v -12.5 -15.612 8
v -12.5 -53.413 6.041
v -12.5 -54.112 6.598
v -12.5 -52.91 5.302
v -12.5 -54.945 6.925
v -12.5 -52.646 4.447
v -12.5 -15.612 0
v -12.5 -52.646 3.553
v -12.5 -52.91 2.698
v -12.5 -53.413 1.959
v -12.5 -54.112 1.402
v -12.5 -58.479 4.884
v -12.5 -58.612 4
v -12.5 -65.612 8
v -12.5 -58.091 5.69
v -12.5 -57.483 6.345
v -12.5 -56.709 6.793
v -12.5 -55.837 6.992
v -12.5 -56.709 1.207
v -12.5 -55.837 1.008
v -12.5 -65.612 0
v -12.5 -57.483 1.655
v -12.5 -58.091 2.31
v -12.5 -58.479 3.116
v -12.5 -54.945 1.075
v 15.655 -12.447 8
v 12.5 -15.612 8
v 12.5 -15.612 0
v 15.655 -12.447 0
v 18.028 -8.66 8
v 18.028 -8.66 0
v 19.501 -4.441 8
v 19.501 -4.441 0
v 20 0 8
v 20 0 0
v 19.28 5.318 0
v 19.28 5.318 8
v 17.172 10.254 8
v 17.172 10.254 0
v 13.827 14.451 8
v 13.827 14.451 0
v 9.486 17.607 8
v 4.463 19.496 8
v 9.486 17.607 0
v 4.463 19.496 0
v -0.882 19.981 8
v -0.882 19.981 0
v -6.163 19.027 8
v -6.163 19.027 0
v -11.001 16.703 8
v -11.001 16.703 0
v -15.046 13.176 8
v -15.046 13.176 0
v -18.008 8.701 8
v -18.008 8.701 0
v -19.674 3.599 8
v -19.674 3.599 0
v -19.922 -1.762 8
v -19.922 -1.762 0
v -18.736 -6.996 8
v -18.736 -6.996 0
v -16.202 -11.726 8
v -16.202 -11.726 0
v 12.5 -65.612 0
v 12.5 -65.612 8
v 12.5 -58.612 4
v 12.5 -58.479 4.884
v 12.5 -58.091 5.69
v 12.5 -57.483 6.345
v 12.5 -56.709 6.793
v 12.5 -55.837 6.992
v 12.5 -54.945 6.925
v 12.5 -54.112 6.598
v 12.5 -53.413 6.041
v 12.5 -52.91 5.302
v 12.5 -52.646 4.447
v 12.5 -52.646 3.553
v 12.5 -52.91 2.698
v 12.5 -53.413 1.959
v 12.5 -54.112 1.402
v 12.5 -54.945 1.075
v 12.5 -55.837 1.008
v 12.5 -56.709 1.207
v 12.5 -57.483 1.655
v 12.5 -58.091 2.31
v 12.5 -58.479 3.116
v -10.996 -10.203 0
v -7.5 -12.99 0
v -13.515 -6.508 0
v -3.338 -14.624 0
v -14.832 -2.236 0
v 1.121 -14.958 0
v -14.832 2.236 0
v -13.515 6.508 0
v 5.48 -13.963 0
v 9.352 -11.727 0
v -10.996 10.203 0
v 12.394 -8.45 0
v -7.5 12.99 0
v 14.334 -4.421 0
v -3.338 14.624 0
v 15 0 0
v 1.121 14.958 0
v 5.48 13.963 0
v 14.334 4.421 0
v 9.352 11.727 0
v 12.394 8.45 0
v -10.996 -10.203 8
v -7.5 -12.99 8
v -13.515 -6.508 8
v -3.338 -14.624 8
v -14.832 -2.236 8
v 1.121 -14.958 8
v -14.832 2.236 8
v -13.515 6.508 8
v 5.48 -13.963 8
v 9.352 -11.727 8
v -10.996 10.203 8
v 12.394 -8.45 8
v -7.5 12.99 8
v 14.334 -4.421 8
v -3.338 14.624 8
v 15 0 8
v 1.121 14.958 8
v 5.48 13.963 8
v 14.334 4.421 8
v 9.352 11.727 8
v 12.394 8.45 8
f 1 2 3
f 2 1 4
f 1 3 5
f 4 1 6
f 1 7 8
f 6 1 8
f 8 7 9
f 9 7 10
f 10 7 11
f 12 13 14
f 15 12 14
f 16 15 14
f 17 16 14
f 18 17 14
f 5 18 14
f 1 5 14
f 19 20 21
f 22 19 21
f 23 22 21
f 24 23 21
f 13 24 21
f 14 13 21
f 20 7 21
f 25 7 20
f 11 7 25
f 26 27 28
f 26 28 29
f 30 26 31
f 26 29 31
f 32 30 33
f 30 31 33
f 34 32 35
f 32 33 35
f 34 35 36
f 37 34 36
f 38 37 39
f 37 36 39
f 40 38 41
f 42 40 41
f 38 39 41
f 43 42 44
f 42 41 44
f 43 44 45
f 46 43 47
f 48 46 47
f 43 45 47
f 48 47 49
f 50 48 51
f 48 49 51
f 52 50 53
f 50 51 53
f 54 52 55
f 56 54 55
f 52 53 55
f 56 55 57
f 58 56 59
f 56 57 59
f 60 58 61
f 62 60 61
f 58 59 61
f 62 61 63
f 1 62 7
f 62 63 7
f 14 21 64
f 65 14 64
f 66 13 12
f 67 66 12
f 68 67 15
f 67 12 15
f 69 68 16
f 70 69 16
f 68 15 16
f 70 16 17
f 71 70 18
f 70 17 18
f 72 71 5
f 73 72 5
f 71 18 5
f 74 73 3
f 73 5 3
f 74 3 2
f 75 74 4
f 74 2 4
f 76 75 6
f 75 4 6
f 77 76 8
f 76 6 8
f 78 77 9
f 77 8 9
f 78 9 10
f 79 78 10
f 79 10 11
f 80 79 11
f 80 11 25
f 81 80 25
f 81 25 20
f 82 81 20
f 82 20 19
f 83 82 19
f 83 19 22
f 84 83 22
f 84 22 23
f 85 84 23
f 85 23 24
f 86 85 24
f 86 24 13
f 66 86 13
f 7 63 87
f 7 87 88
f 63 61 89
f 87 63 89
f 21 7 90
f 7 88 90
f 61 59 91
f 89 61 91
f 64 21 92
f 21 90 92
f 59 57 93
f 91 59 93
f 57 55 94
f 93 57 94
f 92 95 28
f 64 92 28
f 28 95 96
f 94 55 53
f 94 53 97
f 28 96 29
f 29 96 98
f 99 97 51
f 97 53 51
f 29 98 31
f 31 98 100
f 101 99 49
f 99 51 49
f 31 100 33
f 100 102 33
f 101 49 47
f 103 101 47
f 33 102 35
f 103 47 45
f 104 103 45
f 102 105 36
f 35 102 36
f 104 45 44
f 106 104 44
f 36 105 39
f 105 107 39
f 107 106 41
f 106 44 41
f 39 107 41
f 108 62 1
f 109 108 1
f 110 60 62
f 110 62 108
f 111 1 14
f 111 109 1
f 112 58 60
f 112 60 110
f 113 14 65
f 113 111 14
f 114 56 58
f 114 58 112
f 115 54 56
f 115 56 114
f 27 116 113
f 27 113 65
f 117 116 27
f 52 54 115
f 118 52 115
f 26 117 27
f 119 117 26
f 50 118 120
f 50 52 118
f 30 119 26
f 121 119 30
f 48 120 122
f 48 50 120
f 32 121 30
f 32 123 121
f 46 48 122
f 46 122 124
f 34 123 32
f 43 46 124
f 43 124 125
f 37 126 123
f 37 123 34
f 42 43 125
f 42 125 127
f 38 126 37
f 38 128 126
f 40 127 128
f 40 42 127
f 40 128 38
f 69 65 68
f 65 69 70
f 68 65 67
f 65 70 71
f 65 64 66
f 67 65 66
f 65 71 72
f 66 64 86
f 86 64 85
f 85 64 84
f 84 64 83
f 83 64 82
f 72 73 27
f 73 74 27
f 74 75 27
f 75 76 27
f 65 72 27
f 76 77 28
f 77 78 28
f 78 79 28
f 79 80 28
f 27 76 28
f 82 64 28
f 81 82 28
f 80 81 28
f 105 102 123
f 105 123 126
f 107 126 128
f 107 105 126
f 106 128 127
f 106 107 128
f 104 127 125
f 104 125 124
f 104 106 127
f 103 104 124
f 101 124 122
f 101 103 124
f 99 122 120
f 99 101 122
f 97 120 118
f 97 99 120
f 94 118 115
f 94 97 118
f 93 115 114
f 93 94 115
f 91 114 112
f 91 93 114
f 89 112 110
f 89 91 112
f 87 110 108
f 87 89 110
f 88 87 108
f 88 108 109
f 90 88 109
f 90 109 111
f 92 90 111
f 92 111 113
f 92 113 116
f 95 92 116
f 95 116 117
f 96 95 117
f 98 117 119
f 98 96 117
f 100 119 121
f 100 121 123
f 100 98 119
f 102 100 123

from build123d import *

# Parameters (mm, degrees)
F0_R     = 15
F1_DEPTH = 8
F3_D     = 6


with BuildPart() as f1:
    # F0 (on Top) → F1 (new body)
    with BuildSketch(Plane.XY):
        with BuildLine():
            ThreePointArc((12.5, -15.612494996), (18.0277563773, -8.6602540378), (20, 0))
            ThreePointArc((20, 0), (-8.6602540378, 18.0277563773), (-12.5, -15.612494996))
            Line((-12.5, -15.612494996), (12.5, -15.612494996))
        make_face()
        Circle(F0_R, mode=Mode.SUBTRACT)
        with BuildLine():
            Line((12.5, -15.612494996), (-12.5, -15.612494996))
            ThreePointArc((-12.5, -15.612494996), (0, -20), (12.5, -15.612494996))
        make_face()
        with BuildLine():
            ThreePointArc((12.5, -15.612494996), (0, -20), (-12.5, -15.612494996))
            Line((-12.5, -15.612494996), (-12.5, -65.612494996))
            Line((-12.5, -65.612494996), (12.5, -65.612494996))
            Line((12.5, -65.612494996), (12.5, -15.612494996))
        make_face()
    extrude(amount=F1_DEPTH)

    # F3 (through all)
    with Locations(Plane.YZ.offset(12.5)):
        with Locations((-55.612494996, 4)):
            Hole(F3_D / 2)


solid = f1.part
